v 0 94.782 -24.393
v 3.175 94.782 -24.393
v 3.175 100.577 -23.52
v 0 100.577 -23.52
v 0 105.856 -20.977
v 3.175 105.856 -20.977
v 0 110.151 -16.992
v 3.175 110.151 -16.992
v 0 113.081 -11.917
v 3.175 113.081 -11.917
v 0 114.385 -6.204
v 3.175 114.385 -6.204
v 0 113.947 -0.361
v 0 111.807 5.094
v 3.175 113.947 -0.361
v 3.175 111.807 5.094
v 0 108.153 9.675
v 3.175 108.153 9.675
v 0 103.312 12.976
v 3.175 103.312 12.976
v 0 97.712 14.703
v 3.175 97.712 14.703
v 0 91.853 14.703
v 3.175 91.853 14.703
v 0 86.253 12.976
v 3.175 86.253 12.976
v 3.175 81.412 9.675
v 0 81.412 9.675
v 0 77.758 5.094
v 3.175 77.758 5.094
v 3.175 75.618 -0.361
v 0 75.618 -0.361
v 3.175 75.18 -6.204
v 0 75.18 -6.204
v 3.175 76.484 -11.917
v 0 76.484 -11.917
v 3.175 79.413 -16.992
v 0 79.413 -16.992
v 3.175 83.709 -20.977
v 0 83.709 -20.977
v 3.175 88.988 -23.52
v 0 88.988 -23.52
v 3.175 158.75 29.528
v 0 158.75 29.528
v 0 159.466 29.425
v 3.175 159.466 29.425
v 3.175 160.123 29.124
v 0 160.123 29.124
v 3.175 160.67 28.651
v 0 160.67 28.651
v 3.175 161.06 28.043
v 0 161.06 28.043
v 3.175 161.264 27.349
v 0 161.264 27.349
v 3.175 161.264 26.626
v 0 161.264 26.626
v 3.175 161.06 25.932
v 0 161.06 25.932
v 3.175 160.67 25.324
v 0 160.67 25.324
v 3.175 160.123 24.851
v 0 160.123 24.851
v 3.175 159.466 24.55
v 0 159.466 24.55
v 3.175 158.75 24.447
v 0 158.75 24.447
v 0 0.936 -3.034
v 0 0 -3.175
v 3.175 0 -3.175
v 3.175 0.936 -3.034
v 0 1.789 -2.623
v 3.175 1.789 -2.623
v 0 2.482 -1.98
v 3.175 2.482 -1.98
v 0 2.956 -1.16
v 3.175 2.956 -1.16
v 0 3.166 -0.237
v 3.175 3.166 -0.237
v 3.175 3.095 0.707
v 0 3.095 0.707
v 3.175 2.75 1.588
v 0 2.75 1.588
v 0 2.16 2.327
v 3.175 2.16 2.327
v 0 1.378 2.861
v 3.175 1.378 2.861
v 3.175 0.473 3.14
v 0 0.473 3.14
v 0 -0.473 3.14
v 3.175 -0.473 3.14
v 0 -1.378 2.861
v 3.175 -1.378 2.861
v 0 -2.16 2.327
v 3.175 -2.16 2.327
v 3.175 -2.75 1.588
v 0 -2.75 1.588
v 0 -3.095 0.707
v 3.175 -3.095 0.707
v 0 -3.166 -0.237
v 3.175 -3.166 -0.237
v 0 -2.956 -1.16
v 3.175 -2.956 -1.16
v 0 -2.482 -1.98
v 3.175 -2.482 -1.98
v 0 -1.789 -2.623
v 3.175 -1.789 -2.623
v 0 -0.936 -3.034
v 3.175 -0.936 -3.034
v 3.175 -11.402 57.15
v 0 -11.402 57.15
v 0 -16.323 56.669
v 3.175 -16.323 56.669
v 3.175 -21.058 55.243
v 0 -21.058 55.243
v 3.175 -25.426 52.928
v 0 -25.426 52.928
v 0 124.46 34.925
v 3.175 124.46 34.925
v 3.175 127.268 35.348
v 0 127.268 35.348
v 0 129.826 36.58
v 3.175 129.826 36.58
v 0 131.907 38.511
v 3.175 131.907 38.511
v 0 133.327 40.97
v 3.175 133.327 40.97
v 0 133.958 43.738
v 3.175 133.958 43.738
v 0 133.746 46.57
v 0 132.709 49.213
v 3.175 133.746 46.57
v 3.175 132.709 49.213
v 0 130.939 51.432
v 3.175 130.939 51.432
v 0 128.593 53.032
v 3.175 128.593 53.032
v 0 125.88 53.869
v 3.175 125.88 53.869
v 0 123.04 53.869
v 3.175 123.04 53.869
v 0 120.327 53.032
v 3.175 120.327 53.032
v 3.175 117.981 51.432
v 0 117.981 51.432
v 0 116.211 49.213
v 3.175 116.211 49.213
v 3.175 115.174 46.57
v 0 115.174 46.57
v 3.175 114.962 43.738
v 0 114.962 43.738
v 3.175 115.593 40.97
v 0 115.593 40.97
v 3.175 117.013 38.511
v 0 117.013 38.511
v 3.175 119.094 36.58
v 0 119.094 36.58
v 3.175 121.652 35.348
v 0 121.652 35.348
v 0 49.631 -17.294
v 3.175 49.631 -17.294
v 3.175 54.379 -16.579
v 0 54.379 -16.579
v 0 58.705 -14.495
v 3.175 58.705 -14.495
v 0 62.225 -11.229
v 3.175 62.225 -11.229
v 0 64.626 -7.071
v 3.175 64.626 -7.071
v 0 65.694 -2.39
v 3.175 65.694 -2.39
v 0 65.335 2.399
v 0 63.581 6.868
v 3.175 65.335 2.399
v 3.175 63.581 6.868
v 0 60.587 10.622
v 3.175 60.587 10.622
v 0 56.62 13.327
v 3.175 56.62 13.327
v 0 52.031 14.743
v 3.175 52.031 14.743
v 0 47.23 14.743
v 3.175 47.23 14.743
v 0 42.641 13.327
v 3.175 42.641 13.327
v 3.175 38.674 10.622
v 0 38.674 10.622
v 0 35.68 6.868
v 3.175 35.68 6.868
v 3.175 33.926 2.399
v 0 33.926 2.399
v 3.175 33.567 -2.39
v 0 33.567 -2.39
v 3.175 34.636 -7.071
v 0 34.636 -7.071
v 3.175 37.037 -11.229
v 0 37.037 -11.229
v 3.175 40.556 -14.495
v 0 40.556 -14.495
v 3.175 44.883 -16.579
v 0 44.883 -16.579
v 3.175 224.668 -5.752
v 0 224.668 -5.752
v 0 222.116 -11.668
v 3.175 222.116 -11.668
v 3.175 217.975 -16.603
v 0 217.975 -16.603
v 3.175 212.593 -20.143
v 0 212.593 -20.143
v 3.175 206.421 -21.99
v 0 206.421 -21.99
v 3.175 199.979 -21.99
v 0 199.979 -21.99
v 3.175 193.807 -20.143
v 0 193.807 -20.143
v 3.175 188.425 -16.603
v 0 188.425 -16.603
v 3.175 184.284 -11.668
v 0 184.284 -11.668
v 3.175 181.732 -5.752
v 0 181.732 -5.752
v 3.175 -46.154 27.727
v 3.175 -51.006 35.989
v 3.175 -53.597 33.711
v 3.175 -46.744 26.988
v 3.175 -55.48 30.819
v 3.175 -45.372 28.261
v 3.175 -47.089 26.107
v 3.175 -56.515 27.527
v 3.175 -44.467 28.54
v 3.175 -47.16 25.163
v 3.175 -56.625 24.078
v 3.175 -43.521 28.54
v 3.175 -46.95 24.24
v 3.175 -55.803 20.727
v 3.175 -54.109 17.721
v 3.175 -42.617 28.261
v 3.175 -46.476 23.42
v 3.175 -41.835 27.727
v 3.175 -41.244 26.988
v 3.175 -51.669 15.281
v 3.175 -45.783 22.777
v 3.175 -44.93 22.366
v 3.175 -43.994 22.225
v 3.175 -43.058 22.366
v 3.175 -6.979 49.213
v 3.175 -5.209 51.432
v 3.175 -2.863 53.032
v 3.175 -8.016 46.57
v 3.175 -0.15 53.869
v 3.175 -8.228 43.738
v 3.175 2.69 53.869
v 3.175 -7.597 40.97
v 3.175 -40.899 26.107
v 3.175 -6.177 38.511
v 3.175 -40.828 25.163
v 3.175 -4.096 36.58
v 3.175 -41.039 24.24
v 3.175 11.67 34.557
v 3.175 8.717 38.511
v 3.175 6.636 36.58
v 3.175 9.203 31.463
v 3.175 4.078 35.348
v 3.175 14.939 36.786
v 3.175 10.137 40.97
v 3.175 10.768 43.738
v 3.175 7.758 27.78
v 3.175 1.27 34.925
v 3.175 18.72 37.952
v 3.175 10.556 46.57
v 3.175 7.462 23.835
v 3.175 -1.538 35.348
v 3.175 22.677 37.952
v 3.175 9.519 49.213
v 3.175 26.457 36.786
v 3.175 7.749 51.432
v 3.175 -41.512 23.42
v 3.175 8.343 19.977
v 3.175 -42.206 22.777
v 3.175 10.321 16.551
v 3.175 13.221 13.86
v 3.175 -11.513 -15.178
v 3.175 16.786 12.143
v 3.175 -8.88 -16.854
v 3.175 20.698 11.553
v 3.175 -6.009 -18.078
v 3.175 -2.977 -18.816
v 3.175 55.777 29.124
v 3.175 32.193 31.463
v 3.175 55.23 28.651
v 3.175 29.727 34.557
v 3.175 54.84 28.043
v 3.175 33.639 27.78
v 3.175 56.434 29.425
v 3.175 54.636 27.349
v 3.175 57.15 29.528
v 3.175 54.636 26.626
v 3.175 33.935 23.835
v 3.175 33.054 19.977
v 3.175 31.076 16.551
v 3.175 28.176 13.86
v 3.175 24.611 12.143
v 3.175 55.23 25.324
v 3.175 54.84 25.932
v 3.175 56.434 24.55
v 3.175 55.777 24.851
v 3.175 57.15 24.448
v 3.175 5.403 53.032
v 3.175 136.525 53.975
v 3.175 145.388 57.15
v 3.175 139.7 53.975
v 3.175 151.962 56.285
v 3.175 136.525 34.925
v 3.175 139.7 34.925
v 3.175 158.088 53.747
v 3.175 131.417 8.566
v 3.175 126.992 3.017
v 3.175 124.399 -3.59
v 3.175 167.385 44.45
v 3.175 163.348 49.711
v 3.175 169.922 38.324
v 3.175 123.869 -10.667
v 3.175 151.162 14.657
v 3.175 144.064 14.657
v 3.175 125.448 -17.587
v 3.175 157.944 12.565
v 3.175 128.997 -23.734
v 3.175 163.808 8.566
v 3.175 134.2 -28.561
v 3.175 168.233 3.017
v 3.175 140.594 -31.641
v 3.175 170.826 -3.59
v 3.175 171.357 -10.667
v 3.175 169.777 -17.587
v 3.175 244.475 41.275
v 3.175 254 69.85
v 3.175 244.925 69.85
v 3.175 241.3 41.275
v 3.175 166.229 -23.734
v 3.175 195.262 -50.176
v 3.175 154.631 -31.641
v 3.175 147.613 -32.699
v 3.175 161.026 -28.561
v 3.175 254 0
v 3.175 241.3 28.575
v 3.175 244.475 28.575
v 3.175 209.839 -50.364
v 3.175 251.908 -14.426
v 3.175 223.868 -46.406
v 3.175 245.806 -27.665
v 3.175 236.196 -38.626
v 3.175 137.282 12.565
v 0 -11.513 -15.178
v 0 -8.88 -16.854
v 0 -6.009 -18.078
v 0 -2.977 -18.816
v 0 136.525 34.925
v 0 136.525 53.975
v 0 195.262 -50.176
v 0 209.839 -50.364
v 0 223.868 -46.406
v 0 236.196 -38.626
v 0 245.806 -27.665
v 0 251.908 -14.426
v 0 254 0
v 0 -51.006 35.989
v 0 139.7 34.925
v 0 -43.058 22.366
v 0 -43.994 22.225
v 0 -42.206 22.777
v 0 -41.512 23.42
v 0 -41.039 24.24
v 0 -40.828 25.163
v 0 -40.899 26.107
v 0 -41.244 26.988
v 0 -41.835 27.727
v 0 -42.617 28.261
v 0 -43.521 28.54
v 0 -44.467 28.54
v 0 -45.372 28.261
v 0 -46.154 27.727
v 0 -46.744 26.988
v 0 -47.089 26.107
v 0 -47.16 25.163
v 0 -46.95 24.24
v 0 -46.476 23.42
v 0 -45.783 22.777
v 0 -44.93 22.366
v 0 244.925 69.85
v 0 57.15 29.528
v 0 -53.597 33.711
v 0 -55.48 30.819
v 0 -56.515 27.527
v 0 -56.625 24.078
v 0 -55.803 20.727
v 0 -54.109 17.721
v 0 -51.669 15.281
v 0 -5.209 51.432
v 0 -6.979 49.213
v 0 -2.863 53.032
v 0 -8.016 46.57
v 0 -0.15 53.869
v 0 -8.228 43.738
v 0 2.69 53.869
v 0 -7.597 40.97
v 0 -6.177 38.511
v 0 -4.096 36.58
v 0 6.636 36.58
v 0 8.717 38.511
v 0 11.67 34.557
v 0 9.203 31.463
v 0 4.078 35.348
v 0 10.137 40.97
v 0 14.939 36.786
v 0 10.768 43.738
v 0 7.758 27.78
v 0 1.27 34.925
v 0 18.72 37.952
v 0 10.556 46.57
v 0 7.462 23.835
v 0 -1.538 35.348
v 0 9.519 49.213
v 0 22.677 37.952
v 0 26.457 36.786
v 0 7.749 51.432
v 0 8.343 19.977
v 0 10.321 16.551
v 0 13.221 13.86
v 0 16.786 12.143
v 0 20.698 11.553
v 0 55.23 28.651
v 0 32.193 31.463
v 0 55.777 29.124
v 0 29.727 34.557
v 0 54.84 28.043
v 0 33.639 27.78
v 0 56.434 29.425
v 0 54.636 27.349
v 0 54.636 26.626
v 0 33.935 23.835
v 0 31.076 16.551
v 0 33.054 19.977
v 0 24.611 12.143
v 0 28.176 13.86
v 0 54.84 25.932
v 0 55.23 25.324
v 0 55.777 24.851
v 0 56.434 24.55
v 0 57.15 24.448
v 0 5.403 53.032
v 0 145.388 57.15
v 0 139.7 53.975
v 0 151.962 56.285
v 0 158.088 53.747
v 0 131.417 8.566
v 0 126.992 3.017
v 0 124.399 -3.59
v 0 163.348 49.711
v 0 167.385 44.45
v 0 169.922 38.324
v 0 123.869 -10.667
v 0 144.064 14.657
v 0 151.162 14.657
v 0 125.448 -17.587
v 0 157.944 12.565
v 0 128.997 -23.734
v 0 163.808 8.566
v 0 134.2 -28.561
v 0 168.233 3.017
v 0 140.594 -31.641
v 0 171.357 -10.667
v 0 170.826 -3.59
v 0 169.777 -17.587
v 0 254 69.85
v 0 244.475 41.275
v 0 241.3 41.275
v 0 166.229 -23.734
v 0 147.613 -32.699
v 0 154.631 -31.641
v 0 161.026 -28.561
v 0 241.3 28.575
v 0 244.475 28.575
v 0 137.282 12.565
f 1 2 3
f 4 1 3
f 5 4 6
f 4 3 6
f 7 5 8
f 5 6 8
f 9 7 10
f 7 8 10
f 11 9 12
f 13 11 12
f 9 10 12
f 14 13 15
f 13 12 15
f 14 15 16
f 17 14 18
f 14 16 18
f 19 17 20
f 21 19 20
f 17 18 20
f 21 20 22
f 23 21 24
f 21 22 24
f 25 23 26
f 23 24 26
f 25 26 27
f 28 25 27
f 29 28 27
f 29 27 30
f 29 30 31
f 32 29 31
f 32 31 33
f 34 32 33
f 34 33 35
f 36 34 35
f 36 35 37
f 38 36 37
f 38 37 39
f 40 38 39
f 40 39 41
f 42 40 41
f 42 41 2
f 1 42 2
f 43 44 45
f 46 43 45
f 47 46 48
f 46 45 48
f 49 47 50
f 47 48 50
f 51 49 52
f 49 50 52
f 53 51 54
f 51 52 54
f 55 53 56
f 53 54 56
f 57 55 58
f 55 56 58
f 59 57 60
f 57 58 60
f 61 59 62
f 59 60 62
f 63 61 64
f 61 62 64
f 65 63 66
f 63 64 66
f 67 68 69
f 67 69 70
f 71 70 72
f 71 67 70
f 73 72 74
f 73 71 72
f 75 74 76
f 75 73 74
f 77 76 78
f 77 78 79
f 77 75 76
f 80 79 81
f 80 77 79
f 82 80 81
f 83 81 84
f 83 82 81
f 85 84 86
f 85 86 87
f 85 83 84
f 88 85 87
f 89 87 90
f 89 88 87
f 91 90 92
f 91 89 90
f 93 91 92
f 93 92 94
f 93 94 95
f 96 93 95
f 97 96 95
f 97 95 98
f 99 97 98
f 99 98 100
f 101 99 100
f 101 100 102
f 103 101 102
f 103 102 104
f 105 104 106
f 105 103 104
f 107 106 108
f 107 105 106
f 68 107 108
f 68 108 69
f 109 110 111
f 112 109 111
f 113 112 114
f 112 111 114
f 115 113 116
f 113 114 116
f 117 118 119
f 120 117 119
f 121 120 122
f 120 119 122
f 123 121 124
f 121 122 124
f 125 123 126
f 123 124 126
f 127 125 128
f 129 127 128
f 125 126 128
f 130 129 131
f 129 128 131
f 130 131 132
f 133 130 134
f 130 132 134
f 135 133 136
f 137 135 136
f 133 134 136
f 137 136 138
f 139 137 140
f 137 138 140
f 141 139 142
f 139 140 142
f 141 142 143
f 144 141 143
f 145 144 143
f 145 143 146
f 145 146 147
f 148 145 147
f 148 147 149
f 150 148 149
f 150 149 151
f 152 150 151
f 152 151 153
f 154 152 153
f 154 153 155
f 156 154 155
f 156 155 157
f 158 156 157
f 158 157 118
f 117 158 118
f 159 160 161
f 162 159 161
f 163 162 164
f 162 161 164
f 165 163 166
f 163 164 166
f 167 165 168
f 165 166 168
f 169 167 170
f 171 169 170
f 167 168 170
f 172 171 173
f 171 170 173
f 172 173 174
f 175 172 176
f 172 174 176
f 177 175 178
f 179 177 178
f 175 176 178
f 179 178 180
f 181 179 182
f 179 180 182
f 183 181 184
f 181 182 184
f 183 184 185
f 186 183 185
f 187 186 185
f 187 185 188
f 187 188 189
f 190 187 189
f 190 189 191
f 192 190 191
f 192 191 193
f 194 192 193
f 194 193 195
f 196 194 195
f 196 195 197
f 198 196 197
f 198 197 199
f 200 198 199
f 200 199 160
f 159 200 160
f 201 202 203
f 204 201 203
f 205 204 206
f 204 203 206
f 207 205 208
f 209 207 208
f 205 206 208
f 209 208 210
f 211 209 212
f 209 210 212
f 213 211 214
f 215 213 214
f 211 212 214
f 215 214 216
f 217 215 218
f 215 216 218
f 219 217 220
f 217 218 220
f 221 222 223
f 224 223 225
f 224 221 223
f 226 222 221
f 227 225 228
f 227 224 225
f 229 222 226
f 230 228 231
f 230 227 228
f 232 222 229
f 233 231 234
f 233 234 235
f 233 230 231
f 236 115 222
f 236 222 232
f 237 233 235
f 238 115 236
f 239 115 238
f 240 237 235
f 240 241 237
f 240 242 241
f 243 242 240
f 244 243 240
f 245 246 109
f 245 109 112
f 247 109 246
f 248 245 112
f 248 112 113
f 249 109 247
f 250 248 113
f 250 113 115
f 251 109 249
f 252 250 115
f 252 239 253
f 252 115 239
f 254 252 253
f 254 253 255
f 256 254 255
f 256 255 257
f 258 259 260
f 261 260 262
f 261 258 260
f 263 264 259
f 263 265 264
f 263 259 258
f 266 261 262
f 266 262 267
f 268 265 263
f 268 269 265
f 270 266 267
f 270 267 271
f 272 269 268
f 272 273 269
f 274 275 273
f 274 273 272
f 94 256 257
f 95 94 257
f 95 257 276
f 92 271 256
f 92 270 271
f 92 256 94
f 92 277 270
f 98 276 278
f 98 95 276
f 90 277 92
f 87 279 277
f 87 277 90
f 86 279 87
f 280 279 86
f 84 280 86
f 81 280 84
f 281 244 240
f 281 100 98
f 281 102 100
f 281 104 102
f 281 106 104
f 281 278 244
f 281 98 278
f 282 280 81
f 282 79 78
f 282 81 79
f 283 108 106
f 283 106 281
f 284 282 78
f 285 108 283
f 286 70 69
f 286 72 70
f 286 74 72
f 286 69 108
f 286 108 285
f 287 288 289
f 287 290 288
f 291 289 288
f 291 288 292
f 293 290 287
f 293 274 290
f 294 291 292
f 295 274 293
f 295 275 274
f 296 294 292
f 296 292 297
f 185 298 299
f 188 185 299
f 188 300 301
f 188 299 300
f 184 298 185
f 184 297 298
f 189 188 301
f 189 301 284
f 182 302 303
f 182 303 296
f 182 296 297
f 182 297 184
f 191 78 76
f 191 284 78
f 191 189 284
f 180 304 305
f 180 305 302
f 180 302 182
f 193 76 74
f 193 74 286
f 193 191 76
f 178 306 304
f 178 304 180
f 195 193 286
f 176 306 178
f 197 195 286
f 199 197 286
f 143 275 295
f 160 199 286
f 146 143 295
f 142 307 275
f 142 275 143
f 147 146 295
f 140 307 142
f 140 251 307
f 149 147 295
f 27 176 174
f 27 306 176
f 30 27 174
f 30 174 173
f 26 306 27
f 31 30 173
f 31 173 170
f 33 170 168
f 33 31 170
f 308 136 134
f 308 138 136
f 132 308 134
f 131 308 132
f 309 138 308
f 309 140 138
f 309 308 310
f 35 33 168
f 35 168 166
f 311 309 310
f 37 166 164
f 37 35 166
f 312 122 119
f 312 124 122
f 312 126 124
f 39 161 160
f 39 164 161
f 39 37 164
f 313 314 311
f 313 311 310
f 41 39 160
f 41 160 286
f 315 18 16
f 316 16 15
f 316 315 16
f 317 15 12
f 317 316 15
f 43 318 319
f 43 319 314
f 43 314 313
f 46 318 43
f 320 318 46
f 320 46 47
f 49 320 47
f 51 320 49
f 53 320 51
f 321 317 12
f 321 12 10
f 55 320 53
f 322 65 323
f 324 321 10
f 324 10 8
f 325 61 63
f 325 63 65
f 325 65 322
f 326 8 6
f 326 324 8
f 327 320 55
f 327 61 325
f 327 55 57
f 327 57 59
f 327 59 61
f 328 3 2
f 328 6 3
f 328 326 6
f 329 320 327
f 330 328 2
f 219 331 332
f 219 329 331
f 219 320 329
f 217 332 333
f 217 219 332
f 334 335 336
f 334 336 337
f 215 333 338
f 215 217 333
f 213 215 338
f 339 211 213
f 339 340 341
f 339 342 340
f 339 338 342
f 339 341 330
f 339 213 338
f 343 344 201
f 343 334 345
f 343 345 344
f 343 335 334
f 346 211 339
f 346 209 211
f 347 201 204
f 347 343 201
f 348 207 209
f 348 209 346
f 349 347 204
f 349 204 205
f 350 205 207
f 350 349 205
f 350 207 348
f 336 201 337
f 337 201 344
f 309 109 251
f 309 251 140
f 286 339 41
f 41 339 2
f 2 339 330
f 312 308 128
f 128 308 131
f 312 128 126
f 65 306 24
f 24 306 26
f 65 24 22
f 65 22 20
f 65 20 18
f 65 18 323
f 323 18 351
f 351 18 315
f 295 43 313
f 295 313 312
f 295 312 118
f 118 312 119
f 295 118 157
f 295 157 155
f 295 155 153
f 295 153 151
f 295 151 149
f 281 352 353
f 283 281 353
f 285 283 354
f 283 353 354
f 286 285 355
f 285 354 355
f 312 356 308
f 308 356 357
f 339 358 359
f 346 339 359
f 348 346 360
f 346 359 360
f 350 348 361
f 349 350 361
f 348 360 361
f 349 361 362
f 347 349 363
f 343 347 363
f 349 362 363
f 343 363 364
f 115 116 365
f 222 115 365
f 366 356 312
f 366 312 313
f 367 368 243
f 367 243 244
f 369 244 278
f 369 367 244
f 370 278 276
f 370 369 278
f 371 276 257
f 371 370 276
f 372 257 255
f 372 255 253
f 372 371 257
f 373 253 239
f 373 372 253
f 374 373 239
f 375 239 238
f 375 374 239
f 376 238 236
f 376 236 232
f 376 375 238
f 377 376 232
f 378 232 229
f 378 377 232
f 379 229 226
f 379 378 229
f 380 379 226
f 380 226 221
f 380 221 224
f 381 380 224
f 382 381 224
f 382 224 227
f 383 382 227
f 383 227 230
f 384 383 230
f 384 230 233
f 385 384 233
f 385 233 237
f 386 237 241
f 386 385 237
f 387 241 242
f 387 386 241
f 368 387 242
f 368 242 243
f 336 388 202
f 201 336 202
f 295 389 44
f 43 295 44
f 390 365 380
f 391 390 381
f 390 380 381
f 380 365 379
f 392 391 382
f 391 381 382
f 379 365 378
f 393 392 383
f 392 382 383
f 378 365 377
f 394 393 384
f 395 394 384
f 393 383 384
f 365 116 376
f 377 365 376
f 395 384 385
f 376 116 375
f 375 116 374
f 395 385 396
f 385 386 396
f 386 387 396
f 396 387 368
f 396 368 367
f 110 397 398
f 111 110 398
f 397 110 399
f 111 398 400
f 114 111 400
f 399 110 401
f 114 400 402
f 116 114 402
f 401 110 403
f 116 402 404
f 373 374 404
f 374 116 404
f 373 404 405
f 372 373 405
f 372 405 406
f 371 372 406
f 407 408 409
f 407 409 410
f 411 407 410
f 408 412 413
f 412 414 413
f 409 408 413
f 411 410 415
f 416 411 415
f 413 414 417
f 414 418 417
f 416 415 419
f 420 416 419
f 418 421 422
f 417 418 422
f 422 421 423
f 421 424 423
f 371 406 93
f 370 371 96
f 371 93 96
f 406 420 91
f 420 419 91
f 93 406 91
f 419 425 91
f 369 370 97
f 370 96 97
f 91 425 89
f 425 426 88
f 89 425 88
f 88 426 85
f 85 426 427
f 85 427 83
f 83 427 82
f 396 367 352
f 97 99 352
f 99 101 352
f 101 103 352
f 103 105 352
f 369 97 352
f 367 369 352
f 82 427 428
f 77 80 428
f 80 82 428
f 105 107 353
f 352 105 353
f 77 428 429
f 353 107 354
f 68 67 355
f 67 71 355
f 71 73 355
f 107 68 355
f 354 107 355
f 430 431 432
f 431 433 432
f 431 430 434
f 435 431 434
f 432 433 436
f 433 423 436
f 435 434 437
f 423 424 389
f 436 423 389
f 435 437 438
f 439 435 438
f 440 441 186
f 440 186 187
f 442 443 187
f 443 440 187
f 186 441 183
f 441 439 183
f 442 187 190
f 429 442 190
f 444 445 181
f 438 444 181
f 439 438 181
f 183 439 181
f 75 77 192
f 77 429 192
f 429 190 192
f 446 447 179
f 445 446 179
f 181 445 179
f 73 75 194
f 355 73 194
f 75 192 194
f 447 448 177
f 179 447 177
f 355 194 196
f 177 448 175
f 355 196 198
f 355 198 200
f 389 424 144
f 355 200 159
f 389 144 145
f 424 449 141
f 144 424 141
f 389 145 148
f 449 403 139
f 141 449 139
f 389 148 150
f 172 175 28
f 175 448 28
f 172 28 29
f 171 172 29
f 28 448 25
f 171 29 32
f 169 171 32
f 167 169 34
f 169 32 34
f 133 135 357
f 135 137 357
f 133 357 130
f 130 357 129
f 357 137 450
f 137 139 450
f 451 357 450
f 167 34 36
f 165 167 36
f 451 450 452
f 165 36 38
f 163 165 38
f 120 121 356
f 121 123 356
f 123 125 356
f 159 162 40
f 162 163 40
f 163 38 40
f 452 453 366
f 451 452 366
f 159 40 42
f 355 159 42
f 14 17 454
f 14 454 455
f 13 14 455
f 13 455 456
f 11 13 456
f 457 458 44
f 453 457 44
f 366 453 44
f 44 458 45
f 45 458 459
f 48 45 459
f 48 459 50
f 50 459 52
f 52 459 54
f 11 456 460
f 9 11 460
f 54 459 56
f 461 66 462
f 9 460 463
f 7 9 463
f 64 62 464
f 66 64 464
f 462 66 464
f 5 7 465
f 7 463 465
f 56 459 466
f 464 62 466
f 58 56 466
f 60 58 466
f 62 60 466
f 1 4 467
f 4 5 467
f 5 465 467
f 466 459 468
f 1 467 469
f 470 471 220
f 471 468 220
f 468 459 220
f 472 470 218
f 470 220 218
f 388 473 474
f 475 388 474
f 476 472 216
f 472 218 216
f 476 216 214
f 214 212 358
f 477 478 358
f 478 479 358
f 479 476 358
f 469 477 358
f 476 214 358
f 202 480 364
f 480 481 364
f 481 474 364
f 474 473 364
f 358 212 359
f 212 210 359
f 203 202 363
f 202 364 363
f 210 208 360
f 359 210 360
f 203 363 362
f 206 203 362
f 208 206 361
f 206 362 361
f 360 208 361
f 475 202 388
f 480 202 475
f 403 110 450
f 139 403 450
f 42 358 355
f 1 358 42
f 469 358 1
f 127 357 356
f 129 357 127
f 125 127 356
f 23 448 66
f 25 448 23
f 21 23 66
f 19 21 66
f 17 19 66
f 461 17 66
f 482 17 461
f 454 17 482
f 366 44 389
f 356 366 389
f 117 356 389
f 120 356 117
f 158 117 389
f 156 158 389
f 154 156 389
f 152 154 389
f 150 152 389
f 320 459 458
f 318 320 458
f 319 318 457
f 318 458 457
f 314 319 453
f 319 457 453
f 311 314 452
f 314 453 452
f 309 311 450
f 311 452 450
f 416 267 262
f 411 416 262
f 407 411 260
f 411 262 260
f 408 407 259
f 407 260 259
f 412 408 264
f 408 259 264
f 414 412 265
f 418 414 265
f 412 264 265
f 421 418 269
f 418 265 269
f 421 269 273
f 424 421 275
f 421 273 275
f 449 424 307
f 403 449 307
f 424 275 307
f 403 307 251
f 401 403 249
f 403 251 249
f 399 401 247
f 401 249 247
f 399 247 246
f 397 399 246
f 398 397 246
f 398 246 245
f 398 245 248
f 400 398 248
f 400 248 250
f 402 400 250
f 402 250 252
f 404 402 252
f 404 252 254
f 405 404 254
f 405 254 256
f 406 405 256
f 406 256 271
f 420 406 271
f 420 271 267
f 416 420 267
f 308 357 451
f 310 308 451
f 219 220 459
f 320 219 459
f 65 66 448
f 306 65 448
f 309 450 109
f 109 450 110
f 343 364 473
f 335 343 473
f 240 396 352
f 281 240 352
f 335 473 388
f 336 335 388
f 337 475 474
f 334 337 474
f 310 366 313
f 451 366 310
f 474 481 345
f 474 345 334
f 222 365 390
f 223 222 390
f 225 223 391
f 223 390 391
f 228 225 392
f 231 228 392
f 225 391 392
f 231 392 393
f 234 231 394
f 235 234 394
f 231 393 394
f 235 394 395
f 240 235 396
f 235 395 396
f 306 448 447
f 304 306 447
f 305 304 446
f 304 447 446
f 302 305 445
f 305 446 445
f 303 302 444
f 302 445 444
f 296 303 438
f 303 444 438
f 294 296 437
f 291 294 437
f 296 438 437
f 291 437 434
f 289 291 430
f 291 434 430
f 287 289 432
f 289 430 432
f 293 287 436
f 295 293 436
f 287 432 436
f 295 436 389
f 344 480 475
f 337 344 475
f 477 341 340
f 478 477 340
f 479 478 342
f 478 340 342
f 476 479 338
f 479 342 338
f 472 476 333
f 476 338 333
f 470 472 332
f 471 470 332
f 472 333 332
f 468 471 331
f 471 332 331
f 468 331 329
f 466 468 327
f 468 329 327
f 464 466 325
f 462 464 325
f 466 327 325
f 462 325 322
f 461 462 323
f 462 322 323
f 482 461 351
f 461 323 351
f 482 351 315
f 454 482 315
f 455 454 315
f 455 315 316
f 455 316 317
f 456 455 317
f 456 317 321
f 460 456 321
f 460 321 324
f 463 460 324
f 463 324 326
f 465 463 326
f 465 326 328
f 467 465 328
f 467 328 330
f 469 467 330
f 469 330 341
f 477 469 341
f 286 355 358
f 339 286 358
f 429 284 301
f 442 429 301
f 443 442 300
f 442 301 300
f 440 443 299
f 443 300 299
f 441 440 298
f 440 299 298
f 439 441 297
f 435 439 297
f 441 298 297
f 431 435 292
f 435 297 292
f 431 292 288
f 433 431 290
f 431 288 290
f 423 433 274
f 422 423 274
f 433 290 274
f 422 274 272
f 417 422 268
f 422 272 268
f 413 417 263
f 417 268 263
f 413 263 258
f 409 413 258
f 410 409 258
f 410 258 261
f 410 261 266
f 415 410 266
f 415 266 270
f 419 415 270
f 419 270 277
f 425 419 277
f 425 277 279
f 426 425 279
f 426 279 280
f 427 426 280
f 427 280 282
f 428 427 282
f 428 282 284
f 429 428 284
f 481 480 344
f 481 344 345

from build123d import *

# Parameters (mm, degrees)
SKETCH1_R           = 3.175
BOSS_EXTRUDE1_DEPTH = 3.175
SKETCH2_W           = 19.05
SKETCH2_H           = 3.175
SKETCH2_W_2         = 12.7
CUT_EXTRUDE1_DEPTH  = 4.175
SKETCH3_R           = 23.810582085
SKETCH3_R_2         = 19.657709657
SKETCH3_R_3         = 16.108424526
SKETCH3_R_4         = 13.273253647
CUT_EXTRUDE2_DEPTH  = 4.175
SKETCH4_R           = 9.525
CUT_EXTRUDE3_DEPTH  = 4.175


with BuildPart() as part:
    # Sketch1 → Boss-Extrude1 (new body)
    with BuildSketch(Plane(origin=(0, 0, 0), x_dir=(0, 0, -1), z_dir=(1, 0, 0))):
        with BuildLine():
            Line((-69.85, 244.925264201), (5.752253277, 224.667701489))
            ThreePointArc((5.752253277, 224.667701489), (22.225, 203.2), (5.752253277, 181.732298511))
            Line((5.752253277, 181.732298511), (-38.324003746, 169.922101036))
            ThreePointArc((-38.324003746, 169.922101036), (-51.901174843, 160.850125345), (-57.15, 145.387585048))
            Line((-57.15, 145.387585048), (-57.15, -11.402464944))
            ThreePointArc((-57.15, -11.402464944), (-56.071518944, -18.725286548), (-52.927660139, -25.426255839))
            Line((-52.927660139, -25.426255839), (-35.988830069, -51.00598596))
            ThreePointArc((-35.988830069, -51.00598596), (-25.80648624, -56.687583685), (-15.281491626, -51.66910115))
            Line((-15.281491626, -51.66910115), (15.17776256, -11.512515957))
            ThreePointArc((15.17776256, -11.512515957), (17.524552025, -7.46944284), (18.816019124, -2.9765625))
            Line((18.816019124, -2.9765625), (50.176050998, 195.2625))
            ThreePointArc((50.176050998, 195.2625), (38.625542067, 236.195567884), (0, 254))
            Line((0, 254), (-69.85, 254))
            Line((-69.85, 254), (-69.85, 244.925264201))
        make_face()
        Circle(SKETCH1_R, mode=Mode.SUBTRACT)
        with Locations((-25.4, -43.994090512)):
            Circle(SKETCH1_R, mode=Mode.SUBTRACT)
        with BuildLine():
            Line((-24.4475, 158.75), (-24.4475, 57.15))
            ThreePointArc((-24.4475, 57.15), (-26.9875, 54.61), (-29.5275, 57.15))
            Line((-29.5275, 57.15), (-29.5275, 158.75))
            ThreePointArc((-29.5275, 158.75), (-26.9875, 161.29), (-24.4475, 158.75))
        make_face(mode=Mode.SUBTRACT)
    extrude(amount=BOSS_EXTRUDE1_DEPTH)

    # Sketch2 → Cut-Extrude1 (cut, through all)
    with BuildSketch(Plane.ZY):
        with Locations((44.45, 138.1125)):
            Rectangle(SKETCH2_W, SKETCH2_H)
        with Locations((34.925, 242.8875)):
            Rectangle(SKETCH2_W_2, SKETCH2_H)
    extrude(amount=-CUT_EXTRUDE1_DEPTH, mode=Mode.SUBTRACT)

    # Sketch3 → Cut-Extrude2 (cut, through all)
    with BuildSketch(Plane(origin=(3.175, 0, 0), x_dir=(0, 0, -1), z_dir=(1, 0, 0))):
        with Locations((8.888082085, 147.612778574)):
            Circle(SKETCH3_R)
        with Locations((4.735209657, 94.782459436)):
            Circle(SKETCH3_R_2)
        with Locations((1.185924526, 49.630611073)):
            Circle(SKETCH3_R_3)
        with Locations((-24.826746353, 20.698439358)):
            Circle(SKETCH3_R_4)
    extrude(amount=-CUT_EXTRUDE2_DEPTH, mode=Mode.SUBTRACT)

    # Sketch4 → Cut-Extrude3 (cut, through all)
    with BuildSketch(Plane(origin=(3.175, 0, 0), x_dir=(0, 0, -1), z_dir=(1, 0, 0))):
        with Locations((-44.45, 124.46)):
            Circle(SKETCH4_R)
        with Locations((-44.45, 1.27)):
            Circle(SKETCH4_R)
    extrude(amount=-CUT_EXTRUDE3_DEPTH, mode=Mode.SUBTRACT)


solid = part.part
